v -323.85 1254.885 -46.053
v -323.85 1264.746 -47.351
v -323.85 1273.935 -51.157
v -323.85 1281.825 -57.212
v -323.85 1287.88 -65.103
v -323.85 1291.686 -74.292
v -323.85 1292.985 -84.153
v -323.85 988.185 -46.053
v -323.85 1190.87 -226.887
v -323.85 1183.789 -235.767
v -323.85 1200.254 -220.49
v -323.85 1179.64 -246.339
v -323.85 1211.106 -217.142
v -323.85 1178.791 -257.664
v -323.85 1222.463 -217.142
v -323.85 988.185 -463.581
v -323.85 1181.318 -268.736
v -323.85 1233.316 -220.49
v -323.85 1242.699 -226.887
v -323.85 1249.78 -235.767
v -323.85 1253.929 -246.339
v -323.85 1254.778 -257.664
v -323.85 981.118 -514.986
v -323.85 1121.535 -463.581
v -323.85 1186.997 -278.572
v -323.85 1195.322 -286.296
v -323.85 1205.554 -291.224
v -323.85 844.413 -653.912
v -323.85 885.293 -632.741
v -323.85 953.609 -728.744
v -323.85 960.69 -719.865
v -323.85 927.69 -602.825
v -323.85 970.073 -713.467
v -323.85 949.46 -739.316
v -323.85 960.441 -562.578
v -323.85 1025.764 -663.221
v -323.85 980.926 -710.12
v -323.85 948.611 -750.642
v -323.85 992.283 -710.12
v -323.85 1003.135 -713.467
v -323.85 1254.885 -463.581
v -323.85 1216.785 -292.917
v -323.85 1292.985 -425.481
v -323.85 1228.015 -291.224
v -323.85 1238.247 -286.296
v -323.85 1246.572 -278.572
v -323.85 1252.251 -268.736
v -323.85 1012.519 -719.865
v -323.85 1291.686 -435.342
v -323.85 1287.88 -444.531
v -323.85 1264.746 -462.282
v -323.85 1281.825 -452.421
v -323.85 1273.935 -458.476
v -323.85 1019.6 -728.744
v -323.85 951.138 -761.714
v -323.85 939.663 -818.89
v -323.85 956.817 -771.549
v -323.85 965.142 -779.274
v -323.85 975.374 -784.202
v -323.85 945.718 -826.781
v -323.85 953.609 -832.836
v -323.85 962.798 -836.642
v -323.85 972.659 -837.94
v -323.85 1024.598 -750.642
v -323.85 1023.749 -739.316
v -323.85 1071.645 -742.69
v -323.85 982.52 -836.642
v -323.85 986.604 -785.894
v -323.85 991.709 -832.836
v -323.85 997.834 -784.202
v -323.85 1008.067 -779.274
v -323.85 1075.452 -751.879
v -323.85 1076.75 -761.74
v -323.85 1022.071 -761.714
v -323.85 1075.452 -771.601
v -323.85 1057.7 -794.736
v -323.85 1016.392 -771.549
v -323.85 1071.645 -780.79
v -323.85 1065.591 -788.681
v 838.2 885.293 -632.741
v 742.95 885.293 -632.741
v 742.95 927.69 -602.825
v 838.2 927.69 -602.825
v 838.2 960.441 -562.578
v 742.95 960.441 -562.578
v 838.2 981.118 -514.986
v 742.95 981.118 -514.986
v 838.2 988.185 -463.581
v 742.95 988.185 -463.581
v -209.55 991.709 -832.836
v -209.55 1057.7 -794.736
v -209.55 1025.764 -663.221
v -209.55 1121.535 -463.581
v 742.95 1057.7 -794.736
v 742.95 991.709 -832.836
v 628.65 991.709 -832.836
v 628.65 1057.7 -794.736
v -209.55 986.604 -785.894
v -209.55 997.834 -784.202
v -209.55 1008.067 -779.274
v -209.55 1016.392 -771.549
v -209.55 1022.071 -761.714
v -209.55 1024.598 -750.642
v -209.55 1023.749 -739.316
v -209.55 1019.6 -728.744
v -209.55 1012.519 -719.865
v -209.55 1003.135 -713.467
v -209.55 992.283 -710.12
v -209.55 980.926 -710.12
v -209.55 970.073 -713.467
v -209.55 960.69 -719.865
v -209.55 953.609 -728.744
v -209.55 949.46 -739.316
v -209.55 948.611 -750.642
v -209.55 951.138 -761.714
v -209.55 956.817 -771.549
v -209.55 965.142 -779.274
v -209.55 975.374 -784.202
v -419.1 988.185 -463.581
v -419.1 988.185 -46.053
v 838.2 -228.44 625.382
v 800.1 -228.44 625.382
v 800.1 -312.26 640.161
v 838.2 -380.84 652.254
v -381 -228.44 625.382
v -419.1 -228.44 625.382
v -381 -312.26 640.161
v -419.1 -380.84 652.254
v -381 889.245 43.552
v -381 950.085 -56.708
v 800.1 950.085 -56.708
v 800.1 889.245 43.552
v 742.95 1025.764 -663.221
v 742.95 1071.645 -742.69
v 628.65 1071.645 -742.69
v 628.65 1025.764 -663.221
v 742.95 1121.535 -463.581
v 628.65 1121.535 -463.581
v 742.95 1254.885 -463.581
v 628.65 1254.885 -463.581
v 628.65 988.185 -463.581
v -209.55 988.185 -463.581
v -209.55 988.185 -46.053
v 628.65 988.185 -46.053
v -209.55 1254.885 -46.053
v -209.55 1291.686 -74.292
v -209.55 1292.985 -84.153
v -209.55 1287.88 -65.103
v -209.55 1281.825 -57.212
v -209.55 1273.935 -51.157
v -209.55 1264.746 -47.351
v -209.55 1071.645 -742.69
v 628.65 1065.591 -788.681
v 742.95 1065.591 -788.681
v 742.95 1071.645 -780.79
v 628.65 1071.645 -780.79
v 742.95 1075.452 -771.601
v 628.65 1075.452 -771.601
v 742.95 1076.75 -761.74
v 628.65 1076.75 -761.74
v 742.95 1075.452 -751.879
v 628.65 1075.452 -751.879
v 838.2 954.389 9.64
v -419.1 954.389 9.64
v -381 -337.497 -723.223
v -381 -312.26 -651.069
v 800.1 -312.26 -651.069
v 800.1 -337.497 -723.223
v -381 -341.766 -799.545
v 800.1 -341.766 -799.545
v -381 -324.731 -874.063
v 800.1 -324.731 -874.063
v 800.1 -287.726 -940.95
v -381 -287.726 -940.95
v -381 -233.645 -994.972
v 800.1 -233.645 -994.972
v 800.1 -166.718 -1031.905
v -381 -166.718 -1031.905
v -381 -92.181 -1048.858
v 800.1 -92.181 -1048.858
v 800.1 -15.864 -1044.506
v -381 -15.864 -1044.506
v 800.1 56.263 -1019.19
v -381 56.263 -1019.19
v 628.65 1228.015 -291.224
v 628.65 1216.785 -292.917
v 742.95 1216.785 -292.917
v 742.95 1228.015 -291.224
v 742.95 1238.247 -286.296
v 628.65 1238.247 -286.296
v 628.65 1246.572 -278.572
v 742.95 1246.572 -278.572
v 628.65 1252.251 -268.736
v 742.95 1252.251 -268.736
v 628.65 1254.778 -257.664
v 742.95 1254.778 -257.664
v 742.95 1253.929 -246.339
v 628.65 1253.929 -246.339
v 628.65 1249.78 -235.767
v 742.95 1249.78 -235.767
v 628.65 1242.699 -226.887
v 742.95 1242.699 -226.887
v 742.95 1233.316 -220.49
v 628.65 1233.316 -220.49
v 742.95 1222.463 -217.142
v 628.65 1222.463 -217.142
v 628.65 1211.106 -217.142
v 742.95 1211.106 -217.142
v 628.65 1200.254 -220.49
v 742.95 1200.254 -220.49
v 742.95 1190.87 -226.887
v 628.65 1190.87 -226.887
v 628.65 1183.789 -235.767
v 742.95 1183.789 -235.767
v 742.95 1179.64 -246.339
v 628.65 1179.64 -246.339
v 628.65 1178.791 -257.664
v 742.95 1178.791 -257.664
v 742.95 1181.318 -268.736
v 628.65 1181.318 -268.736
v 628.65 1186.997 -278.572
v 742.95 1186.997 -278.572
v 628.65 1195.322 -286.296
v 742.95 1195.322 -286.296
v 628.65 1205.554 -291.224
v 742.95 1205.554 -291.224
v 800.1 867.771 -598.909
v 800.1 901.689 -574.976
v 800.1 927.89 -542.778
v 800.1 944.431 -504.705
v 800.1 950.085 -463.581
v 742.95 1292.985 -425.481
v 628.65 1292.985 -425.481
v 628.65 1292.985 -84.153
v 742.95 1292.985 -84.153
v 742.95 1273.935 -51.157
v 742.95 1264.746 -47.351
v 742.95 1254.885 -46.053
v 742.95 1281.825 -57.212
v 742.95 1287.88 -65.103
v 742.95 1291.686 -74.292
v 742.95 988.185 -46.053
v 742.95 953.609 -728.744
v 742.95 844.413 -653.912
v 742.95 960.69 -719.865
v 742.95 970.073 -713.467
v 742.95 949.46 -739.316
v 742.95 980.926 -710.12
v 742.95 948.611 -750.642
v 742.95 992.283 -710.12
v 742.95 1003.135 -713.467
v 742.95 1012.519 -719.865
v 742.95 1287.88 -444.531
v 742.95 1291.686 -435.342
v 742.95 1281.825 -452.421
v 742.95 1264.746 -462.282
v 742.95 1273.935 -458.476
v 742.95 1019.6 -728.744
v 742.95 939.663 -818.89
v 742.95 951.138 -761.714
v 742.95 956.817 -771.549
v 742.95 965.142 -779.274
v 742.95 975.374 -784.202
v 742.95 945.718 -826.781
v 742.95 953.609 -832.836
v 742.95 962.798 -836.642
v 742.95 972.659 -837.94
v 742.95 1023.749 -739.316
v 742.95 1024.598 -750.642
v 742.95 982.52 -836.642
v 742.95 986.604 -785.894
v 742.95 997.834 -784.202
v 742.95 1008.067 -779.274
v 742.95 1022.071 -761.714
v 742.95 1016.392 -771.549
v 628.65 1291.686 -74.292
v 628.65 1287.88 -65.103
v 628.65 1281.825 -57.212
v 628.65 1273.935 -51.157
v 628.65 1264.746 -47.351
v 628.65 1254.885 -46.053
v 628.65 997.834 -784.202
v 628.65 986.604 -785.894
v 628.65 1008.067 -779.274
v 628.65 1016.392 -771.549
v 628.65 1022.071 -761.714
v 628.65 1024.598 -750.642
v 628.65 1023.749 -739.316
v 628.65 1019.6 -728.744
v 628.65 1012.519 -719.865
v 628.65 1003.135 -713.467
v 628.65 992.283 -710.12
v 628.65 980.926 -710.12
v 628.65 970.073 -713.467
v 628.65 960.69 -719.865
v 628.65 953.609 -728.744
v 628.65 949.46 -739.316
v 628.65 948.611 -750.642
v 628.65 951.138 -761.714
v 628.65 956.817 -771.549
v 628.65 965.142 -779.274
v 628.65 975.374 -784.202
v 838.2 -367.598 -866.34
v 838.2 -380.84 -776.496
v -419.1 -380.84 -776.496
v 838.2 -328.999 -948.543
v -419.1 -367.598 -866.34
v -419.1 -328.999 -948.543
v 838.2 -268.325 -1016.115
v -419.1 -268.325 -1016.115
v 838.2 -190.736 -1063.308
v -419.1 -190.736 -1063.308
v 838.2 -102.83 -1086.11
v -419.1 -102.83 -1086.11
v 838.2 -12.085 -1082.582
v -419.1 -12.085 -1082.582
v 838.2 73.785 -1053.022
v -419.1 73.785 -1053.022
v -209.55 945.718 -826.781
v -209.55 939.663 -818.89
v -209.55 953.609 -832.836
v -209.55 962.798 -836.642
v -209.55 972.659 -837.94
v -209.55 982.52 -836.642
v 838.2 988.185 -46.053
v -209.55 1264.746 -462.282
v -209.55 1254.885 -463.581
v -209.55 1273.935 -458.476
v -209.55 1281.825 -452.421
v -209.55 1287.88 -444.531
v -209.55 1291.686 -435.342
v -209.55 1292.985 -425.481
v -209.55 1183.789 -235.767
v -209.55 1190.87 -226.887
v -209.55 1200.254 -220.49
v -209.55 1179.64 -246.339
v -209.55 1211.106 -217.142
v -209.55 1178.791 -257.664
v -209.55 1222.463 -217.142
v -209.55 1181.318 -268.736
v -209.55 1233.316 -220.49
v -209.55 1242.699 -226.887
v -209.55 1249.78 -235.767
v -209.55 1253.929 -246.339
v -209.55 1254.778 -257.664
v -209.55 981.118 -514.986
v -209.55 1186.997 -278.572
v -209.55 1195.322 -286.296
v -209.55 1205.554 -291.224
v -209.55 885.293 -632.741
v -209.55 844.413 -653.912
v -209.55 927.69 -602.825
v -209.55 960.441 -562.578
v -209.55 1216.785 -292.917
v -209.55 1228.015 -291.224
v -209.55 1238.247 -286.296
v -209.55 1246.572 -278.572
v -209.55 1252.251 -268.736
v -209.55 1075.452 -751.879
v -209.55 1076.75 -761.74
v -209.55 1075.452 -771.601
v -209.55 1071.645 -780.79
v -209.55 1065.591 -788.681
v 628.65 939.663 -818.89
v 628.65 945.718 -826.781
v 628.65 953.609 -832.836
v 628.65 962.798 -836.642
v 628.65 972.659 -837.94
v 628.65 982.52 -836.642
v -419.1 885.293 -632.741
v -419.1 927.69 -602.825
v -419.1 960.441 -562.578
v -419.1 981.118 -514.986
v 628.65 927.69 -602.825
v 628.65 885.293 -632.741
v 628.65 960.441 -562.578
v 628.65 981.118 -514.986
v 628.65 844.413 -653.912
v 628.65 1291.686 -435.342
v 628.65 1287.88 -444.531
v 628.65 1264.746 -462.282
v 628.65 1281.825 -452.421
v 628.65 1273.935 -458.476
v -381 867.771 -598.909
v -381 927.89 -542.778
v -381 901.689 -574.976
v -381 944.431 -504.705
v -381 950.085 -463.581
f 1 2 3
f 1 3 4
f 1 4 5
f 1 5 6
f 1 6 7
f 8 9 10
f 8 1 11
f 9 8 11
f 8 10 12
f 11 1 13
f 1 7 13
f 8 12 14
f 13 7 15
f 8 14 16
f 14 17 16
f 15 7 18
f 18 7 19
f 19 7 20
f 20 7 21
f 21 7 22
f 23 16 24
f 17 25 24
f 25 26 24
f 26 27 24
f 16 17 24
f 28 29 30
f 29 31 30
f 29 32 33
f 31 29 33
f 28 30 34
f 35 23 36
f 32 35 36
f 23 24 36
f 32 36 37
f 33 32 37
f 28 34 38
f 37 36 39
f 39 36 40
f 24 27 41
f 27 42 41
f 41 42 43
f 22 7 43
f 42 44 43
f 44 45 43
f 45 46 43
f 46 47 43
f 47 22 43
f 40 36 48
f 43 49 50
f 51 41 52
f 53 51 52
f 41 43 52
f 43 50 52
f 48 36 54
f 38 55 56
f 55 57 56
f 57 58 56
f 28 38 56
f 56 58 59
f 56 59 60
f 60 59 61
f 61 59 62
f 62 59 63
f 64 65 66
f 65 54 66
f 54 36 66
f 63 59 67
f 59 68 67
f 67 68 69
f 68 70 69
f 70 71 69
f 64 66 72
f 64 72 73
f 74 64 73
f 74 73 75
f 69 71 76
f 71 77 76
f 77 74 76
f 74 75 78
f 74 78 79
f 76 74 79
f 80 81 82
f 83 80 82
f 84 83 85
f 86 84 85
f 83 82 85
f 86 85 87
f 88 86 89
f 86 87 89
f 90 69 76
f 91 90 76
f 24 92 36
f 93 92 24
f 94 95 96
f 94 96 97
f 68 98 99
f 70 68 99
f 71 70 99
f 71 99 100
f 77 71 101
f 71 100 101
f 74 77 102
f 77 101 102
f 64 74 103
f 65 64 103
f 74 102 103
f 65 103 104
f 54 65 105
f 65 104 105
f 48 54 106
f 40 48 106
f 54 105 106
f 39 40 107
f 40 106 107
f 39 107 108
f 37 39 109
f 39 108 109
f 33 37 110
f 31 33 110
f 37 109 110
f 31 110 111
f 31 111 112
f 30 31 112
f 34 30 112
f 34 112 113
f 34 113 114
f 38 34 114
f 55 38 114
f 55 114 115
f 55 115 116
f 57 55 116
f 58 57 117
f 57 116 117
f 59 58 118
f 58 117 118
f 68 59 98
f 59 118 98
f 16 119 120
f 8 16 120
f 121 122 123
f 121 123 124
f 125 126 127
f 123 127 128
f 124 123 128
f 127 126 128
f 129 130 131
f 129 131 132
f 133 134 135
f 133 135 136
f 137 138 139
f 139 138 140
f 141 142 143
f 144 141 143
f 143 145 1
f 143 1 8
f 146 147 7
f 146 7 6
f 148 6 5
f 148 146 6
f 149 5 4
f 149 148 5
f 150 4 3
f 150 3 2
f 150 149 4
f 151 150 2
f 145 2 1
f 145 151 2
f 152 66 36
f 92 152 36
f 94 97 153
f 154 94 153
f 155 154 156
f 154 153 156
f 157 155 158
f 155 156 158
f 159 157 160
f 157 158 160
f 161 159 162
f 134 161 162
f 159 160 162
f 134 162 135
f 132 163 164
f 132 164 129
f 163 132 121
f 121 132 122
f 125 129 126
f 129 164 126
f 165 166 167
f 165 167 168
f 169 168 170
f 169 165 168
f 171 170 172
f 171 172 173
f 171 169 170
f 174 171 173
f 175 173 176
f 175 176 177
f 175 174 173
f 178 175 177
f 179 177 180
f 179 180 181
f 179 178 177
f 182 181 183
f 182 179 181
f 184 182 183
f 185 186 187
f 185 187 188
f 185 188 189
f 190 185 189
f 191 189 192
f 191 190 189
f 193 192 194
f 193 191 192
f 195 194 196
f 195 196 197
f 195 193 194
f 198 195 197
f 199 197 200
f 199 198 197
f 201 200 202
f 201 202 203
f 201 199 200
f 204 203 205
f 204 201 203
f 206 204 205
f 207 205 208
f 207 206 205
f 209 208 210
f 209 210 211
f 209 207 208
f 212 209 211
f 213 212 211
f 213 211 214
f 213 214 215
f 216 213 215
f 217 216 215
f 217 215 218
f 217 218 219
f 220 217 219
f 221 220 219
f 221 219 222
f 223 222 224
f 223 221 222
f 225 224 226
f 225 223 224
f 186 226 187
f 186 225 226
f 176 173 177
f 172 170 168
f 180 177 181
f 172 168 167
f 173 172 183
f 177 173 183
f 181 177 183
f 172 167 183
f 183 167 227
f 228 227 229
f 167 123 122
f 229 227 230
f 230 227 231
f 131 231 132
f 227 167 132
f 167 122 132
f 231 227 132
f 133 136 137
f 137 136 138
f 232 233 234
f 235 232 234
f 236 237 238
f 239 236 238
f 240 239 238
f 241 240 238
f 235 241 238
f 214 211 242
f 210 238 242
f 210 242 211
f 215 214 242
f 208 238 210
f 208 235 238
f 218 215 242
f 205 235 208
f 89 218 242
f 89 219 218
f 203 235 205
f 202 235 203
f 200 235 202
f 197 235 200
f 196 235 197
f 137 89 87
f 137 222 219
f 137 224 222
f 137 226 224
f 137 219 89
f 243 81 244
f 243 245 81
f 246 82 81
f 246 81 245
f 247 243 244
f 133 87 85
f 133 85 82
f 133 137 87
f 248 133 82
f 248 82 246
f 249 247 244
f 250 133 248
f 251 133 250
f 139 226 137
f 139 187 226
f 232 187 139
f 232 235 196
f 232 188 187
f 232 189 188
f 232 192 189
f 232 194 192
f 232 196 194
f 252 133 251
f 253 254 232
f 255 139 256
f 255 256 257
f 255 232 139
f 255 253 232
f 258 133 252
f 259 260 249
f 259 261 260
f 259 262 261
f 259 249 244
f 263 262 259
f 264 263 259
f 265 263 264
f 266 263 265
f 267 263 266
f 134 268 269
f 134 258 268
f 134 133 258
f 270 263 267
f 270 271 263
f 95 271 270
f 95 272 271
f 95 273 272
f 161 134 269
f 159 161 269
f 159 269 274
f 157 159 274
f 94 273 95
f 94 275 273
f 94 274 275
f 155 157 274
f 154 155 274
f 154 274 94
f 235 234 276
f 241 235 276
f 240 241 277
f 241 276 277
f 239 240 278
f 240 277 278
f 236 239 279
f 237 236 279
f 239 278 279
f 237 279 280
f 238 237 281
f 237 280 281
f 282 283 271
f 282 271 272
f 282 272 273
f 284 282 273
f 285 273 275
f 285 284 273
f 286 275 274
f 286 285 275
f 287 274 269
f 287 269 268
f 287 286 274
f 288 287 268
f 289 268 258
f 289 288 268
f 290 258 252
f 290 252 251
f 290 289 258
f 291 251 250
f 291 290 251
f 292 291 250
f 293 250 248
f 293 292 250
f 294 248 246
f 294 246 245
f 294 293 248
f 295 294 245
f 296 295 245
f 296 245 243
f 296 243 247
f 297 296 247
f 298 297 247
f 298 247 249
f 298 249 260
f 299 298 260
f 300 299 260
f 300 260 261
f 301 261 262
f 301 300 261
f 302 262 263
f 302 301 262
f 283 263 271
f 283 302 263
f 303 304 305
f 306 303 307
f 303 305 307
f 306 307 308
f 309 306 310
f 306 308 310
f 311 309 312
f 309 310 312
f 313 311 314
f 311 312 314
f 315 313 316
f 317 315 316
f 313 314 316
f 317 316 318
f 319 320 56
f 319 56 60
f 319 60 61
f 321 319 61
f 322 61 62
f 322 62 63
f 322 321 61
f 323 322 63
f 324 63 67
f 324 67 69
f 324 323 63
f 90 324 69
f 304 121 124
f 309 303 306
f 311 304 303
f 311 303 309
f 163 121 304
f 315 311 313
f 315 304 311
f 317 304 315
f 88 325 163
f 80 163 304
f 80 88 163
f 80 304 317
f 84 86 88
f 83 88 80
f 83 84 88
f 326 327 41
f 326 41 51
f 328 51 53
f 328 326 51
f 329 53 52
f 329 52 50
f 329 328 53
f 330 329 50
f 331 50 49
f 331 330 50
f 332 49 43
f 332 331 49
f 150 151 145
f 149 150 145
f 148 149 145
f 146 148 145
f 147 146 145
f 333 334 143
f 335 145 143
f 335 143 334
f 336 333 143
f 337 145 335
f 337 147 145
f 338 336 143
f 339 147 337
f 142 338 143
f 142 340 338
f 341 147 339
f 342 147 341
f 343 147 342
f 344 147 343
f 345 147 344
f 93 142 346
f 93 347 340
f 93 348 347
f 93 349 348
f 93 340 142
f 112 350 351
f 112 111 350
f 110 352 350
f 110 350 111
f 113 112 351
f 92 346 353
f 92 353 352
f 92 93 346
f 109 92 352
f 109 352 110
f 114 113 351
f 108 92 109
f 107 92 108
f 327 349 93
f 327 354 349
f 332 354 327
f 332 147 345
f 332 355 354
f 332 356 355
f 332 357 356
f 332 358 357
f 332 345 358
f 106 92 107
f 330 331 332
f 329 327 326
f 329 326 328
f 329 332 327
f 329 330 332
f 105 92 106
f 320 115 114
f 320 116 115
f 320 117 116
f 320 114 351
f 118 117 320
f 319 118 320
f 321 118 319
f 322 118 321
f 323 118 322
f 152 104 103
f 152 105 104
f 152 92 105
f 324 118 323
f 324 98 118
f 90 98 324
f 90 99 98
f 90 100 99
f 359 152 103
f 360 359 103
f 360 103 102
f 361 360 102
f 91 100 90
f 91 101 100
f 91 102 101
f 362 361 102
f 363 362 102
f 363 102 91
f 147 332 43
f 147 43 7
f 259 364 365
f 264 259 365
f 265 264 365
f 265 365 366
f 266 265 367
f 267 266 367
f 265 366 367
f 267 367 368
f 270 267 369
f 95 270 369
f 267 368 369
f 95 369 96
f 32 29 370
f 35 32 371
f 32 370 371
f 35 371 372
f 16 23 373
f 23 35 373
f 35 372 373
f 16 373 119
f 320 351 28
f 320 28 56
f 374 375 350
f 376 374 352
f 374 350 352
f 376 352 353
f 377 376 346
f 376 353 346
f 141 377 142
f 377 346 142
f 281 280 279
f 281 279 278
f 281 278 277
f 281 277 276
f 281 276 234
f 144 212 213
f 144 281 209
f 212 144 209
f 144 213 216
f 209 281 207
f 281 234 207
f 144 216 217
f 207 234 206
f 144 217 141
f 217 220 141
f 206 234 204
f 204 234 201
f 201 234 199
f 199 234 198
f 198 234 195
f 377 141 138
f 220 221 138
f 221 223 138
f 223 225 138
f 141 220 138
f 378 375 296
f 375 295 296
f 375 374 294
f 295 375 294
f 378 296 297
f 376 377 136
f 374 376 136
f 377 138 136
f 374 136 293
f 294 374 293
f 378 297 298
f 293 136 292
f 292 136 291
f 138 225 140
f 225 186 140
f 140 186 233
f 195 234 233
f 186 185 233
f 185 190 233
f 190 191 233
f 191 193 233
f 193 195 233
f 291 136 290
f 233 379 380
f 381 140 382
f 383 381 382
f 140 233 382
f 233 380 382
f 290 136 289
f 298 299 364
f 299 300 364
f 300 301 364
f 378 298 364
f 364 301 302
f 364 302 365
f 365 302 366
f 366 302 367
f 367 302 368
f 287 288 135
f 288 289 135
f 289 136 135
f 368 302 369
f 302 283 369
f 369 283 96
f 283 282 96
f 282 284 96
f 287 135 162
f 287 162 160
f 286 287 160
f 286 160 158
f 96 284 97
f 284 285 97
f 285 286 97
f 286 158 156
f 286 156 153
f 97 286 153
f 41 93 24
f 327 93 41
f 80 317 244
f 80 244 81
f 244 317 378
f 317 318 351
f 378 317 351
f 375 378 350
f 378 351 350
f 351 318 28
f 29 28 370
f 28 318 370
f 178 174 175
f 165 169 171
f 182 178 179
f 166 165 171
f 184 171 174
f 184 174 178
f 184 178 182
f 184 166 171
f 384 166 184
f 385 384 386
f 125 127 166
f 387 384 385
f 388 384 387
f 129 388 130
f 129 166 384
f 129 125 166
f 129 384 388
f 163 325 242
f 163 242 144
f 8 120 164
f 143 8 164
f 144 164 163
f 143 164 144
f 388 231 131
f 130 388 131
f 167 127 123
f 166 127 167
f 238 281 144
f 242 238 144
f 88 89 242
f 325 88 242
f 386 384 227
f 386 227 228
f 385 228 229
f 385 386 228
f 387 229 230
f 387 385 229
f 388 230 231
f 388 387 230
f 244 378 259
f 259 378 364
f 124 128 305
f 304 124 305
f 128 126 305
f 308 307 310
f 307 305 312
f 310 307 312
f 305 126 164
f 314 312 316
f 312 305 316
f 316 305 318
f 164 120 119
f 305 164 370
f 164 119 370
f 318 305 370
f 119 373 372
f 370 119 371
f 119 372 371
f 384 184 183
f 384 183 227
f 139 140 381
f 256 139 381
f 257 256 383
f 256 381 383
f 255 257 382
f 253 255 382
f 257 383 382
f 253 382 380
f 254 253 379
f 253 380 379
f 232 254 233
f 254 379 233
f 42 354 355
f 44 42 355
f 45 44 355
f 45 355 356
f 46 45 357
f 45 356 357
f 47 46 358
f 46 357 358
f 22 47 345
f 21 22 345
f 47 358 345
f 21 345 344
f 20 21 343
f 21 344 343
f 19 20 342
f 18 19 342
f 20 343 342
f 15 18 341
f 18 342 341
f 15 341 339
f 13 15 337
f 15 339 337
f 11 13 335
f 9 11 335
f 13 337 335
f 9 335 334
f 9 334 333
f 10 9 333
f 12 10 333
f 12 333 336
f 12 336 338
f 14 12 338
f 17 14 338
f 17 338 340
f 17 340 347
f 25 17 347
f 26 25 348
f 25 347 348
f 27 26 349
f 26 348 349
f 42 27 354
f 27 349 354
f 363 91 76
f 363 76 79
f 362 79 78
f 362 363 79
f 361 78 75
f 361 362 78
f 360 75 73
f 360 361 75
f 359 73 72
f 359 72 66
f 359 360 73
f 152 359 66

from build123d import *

# Parameters (mm, degrees)
BOSS_EXTRUDE1_DEPTH = 419.1
SHELL1_START        = 12.7
SHELL1_DEPTH        = 393.7
BOSS_EXTRUDE3_START = -69.85
SKETCH3_R           = 12.7
BOSS_EXTRUDE3_DEPTH = 38.1
SCALE3_SCALE        = 3


# Read off the part's stored shape, not the designer's step: Shell1
with BuildPart() as part:
    # Sketch1 → Boss-Extrude1 (new body)
    with BuildSketch(Plane(origin=(0, 0, 0), x_dir=(0, 0, -1), z_dir=(1, 0, 0))):
        with BuildLine():
            Line((0, 0), (476.25, 0))
            ThreePointArc((476.25, 0), (564.93634732, 49.85994299), (568.425328349, 151.541352929))
            Line((568.425328349, 151.541352929), (428.331493685, 422.044080755))
            ThreePointArc((428.331493685, 422.044080755), (404.943942228, 447.093648811), (371.944875703, 456.341352929))
            Line((371.944875703, 456.341352929), (232.768876591, 456.341352929))
            Line((232.768876591, 456.341352929), (214.204669203, 445.076315348))
            Line((214.204669203, 445.076315348), (8.95741062, 50.8))
            Line((8.95741062, 50.8), (0, 0))
        make_face()
    extrude(amount=BOSS_EXTRUDE1_DEPTH)

    # Shell1 outline → Shell1 (cut)
    with BuildSketch(Plane.YZ.offset(SHELL1_START)):
        with BuildLine():
            Line((22.86, -4.030834779), (22.86, -434.440917972))
            ThreePointArc((22.86, -434.440917972), (39.418714995, -540.70503827), (145.700807364, -557.148004752))
            Line((145.700807364, -557.148004752), (416.20353519, -417.054170089))
            ThreePointArc((416.20353519, -417.054170089), (436.243189635, -398.344128923), (443.641352929, -371.944875703))
            Line((443.641352929, -371.944875703), (443.641352929, -236.320754436))
            Line((443.641352929, -236.320754436), (423.361553833, -202.900679848))
            Line((423.361553833, -202.900679848), (50.8, -8.95741062))
            Line((50.8, -8.95741062), (22.86, -4.030834779))
        make_face()
    extrude(amount=SHELL1_DEPTH, mode=Mode.SUBTRACT)

    # Sketch3 → Boss-Extrude3 (add)
    with BuildSketch(Plane(origin=(419.1, 0, 0), x_dir=(0, 0, -1), z_dir=(1, 0, 0)).offset(BOSS_EXTRUDE3_START)):
        with BuildLine():
            Line((232.768876591, 545.241352929), (232.768876591, 456.341352929))
            Line((232.768876591, 456.341352929), (371.944875703, 456.341352929))
            ThreePointArc((371.944875703, 456.341352929), (404.943942228, 447.093648811), (428.331493685, 422.044080755))
            Line((428.331493685, 422.044080755), (435.388694544, 408.417556164))
            Line((435.388694544, 408.417556164), (490.381307684, 440.167556164))
            ThreePointArc((490.381307684, 440.167556164), (496.298565678, 447.879076919), (495.029830312, 457.516078792))
            Line((495.029830312, 457.516078792), (482.329830312, 479.513124048))
            ThreePointArc((482.329830312, 479.513124048), (474.618309557, 485.430382042), (464.981307684, 484.161646676))
            Line((464.981307684, 484.161646676), (438.491684026, 468.867855326))
            Line((438.491684026, 468.867855326), (371.944875703, 500.791352929))
            Line((371.944875703, 500.791352929), (371.944875703, 545.241352929))
            ThreePointArc((371.944875703, 545.241352929), (368.225131824, 554.22160905), (359.244875703, 557.941352929))
            Line((359.244875703, 557.941352929), (245.468876591, 557.941352929))
            ThreePointArc((245.468876591, 557.941352929), (236.48862047, 554.22160905), (232.768876591, 545.241352929))
        make_face()
        with Locations((302.356876147, 532.541352929)):
            Circle(SKETCH3_R, mode=Mode.SUBTRACT)
        with Locations((466.682785056, 455.81460142)):
            Circle(SKETCH3_R, mode=Mode.SUBTRACT)
    boss_extrude3 = extrude(amount=BOSS_EXTRUDE3_DEPTH)

    # Mirror1: Boss-Extrude3 across plane
    add(boss_extrude3.mirror(Plane(origin=(209.55, 0, 0), x_dir=(0, 0, 1), z_dir=(1, 0, 0))))


with BuildPart() as part_1:
    # Scale3: scaled about (209.55, 190.419755822, -326.126976247)
    add(part.part.scale(SCALE3_SCALE).moved(Location((-419.1, -380.839511644, 652.253952494))))


solid = part_1.part
